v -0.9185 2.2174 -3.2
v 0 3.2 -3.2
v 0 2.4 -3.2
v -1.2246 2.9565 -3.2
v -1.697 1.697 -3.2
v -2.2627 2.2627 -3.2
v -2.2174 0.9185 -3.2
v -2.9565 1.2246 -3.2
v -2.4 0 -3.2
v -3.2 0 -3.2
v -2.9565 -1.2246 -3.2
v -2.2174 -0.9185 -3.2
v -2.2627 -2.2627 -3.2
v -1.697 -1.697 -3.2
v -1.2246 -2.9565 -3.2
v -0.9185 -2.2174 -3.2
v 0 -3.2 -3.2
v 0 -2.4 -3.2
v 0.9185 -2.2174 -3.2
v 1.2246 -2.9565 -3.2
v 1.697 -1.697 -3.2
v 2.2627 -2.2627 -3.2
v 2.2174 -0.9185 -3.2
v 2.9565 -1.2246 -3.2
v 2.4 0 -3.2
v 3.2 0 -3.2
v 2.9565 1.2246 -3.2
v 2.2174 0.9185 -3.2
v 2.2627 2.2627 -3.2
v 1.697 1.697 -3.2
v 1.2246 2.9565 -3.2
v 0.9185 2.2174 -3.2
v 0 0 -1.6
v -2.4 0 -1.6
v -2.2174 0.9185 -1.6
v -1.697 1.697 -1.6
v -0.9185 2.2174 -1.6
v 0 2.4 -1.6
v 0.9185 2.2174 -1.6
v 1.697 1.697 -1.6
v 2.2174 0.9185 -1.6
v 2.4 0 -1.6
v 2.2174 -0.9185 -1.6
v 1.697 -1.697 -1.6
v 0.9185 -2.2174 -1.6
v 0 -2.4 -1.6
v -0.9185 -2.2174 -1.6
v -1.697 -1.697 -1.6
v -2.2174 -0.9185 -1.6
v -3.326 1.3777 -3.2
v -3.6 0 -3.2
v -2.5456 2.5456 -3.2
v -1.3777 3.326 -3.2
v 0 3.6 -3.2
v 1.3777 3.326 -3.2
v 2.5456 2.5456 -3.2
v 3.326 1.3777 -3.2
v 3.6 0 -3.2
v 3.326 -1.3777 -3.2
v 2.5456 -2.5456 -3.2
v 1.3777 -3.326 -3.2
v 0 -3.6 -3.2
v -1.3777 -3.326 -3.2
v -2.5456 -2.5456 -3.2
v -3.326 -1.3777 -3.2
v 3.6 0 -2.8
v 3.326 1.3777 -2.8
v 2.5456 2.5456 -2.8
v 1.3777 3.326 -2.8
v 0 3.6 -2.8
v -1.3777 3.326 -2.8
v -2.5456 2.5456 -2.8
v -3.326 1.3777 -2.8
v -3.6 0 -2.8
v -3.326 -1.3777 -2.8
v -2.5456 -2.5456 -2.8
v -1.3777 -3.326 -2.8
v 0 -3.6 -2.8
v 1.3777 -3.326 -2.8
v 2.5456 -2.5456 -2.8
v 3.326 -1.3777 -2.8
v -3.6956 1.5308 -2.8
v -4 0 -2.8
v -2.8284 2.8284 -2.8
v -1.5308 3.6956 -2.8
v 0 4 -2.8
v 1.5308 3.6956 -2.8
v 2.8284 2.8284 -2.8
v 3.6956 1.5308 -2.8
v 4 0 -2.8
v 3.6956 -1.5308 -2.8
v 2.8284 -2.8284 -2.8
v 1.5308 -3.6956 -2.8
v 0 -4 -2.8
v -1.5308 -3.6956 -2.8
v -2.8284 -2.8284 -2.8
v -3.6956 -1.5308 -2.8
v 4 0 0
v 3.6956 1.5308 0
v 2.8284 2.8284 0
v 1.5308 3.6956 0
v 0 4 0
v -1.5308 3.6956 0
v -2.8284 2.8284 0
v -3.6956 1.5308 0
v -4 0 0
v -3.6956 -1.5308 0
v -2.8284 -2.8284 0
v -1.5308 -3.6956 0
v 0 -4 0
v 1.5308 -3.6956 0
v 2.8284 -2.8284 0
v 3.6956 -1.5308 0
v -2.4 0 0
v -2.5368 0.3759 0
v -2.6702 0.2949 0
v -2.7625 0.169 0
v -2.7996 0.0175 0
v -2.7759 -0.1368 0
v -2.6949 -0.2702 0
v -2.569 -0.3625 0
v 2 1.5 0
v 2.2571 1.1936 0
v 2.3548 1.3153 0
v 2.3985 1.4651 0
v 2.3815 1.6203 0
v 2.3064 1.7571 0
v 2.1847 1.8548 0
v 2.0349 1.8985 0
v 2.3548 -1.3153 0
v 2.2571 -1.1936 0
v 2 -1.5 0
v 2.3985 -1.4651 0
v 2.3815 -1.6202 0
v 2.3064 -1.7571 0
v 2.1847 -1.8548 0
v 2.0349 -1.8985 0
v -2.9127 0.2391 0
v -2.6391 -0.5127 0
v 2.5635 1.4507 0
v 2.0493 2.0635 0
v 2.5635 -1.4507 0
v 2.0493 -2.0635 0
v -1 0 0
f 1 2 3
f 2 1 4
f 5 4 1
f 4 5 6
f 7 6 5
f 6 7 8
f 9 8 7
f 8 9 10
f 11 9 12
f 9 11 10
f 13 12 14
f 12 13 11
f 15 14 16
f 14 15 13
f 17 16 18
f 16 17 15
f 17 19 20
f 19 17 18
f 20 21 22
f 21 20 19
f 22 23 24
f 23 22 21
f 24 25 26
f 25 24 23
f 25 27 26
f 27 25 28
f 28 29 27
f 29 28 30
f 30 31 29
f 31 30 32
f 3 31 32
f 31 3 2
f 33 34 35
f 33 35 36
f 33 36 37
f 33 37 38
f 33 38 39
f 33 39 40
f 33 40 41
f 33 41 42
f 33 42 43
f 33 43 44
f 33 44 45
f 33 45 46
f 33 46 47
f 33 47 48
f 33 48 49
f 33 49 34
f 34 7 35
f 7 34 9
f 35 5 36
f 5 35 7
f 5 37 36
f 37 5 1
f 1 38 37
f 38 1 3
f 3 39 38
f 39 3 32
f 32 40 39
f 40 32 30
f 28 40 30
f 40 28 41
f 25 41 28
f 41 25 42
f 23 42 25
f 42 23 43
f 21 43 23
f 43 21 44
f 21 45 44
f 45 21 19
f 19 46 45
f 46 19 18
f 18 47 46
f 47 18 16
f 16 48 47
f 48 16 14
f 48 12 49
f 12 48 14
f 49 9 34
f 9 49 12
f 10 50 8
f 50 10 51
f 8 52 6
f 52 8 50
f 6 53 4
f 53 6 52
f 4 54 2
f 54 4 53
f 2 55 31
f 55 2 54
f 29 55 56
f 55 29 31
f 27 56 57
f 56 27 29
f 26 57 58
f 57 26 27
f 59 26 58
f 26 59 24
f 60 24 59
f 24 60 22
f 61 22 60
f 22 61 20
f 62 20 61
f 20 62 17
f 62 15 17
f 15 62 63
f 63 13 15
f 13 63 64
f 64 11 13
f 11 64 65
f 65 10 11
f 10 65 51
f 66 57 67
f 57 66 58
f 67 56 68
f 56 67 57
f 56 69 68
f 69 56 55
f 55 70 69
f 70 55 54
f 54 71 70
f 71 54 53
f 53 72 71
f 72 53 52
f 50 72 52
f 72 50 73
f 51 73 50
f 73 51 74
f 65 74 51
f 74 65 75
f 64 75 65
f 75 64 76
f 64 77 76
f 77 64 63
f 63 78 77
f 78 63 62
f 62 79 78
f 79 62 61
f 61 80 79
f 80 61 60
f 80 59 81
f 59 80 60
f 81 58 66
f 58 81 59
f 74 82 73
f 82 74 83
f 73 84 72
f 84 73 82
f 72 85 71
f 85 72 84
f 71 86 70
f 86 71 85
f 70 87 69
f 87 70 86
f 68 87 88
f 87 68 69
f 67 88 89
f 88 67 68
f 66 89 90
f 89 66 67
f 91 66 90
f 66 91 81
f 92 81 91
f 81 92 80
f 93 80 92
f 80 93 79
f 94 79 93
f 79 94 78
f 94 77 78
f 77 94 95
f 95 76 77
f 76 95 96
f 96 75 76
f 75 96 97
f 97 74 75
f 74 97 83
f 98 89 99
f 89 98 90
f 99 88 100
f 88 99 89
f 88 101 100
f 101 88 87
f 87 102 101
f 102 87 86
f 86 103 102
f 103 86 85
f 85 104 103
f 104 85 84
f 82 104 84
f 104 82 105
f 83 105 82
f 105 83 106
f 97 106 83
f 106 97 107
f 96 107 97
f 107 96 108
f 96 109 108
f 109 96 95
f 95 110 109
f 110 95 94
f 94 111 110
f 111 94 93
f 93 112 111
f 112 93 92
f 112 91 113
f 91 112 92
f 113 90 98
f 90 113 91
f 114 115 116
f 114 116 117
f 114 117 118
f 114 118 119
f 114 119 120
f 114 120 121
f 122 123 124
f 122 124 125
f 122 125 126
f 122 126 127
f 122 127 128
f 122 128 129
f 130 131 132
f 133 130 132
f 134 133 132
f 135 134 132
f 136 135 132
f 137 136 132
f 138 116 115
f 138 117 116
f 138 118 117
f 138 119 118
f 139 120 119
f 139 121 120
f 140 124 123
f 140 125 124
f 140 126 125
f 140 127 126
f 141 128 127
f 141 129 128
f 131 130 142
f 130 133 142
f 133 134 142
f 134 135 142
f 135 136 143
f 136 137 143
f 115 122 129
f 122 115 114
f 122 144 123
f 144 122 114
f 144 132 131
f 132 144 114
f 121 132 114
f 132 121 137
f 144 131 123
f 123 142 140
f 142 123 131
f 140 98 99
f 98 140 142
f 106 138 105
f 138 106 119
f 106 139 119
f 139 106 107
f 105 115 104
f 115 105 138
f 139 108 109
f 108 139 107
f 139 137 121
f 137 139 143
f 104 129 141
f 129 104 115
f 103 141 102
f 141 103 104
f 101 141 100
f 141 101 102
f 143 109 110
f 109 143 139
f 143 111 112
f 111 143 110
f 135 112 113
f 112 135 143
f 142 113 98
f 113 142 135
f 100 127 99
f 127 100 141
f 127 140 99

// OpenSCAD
// file: ../p/4-4disc.scad
use <../lib.scad>
function ldraw_lib__4_4disc() = [
// 0 Disc 1.0
// 0 Name: 4-4disc.dat
// 0 Author: James Jessiman
// 0 !LDRAW_ORG Primitive UPDATE 2002-02
// 0 !LICENSE Licensed under CC BY 4.0 : see CAreadme.txt
// 
// 0 BFC CERTIFY CCW
  [0,"BFC","CERTIFY"],
  [0,"BFC","CCW"],
// 
// 0 !HISTORY 1998-12-15 [PTadmin] Official Update 1998-10
// 0 !HISTORY 2002-03-23 [sbliss] Added BFC statement
// 0 !HISTORY 2002-04-25 [PTadmin] Official Update 2002-02
// 0 !HISTORY 2007-06-24 [PTadmin] Header formatted for Contributor Agreement
// 0 !HISTORY 2008-07-01 [PTadmin] Official Update 2008-01
// 
// 
// 3 16 0 0 0 1 0 0 0.9239 0 0.3827
  [3,16,0,0,0,1,0,0,0.9239,0,0.3827],
// 3 16 0 0 0 0.9239 0 0.3827 0.7071 0 0.7071
  [3,16,0,0,0,0.9239,0,0.3827,0.7071,0,0.7071],
// 3 16 0 0 0 0.7071 0 0.7071 0.3827 0 0.9239
  [3,16,0,0,0,0.7071,0,0.7071,0.3827,0,0.9239],
// 3 16 0 0 0 0.3827 0 0.9239 0 0 1
  [3,16,0,0,0,0.3827,0,0.9239,0,0,1],
// 3 16 0 0 0 0 0 1 -0.3827 0 0.9239
  [3,16,0,0,0,0,0,1,-0.3827,0,0.9239],
// 3 16 0 0 0 -0.3827 0 0.9239 -0.7071 0 0.7071
  [3,16,0,0,0,-0.3827,0,0.9239,-0.7071,0,0.7071],
// 3 16 0 0 0 -0.7071 0 0.7071 -0.9239 0 0.3827
  [3,16,0,0,0,-0.7071,0,0.7071,-0.9239,0,0.3827],
// 3 16 0 0 0 -0.9239 0 0.3827 -1 0 -0
  [3,16,0,0,0,-0.9239,0,0.3827,-1,0,-0],
// 3 16 0 0 0 -1 0 -0 -0.9239 0 -0.3827
  [3,16,0,0,0,-1,0,-0,-0.9239,0,-0.3827],
// 3 16 0 0 0 -0.9239 0 -0.3827 -0.7071 0 -0.7071
  [3,16,0,0,0,-0.9239,0,-0.3827,-0.7071,0,-0.7071],
// 3 16 0 0 0 -0.7071 0 -0.7071 -0.3827 0 -0.9239
  [3,16,0,0,0,-0.7071,0,-0.7071,-0.3827,0,-0.9239],
// 3 16 0 0 0 -0.3827 0 -0.9239 0 0 -1
  [3,16,0,0,0,-0.3827,0,-0.9239,0,0,-1],
// 3 16 0 0 0 0 0 -1 0.3827 0 -0.9239
  [3,16,0,0,0,0,0,-1,0.3827,0,-0.9239],
// 3 16 0 0 0 0.3827 0 -0.9239 0.7071 0 -0.7071
  [3,16,0,0,0,0.3827,0,-0.9239,0.7071,0,-0.7071],
// 3 16 0 0 0 0.7071 0 -0.7071 0.9239 0 -0.3827
  [3,16,0,0,0,0.7071,0,-0.7071,0.9239,0,-0.3827],
// 3 16 0 0 0 0.9239 0 -0.3827 1 0 0
  [3,16,0,0,0,0.9239,0,-0.3827,1,0,0],
// 0
];
module ldraw_lib__4_4disc(step=0, col=false, unit=2/5, alt=false, line=0.2, solid=!$preview)
    makepoly(ldraw_lib__4_4disc(), step=step, col=col, unit=unit, alt=alt, line=line, solid=solid);
ldraw_lib__4_4disc(line=0.2);
// file: ../p/4-4ring3.scad
use <../lib.scad>
function ldraw_lib__4_4ring3() = [
// 0 Ring  3 x 1.0
// 0 Name: 4-4ring3.dat
// 0 Author: James Jessiman
// 0 !LDRAW_ORG Primitive UPDATE 2009-01
// 0 !LICENSE Licensed under CC BY 4.0 : see CAreadme.txt
// 
// 0 BFC CERTIFY CCW
  [0,"BFC","CERTIFY"],
  [0,"BFC","CCW"],
// 
// 0 !HISTORY 1998-12-15 [PTadmin] Official Update 1998-10
// 0 !HISTORY 2002-04-05 [hafhead] Added BFC statement
// 0 !HISTORY 2002-04-25 [PTadmin] Official Update 2002-02
// 0 !HISTORY 2007-06-24 [PTadmin] Header formatted for Contributor Agreement
// 0 !HISTORY 2008-07-01 [PTadmin] Official Update 2008-01
// 0 !HISTORY 2008-08-26 [cwdee] Switch polygon winding and rename
// 0 !HISTORY 2009-05-02 [PTadmin] Official Update 2009-01
// 
// 
// 4 16 -1.5308 0 3.6956 -1.1481 0 2.7717 0 0 3 0 0 4
  [4,16,-1.5308,0,3.6956,-1.1481,0,2.7717,0,0,3,0,0,4],
// 4 16 -2.8284 0 2.8284 -2.1213 0 2.1213 -1.1481 0 2.7717 -1.5308 0 3.6956
  [4,16,-2.8284,0,2.8284,-2.1213,0,2.1213,-1.1481,0,2.7717,-1.5308,0,3.6956],
// 4 16 -3.6956 0 1.5308 -2.7717 0 1.1481 -2.1213 0 2.1213 -2.8284 0 2.8284
  [4,16,-3.6956,0,1.5308,-2.7717,0,1.1481,-2.1213,0,2.1213,-2.8284,0,2.8284],
// 4 16 -4 0 0 -3 0 0 -2.7717 0 1.1481 -3.6956 0 1.5308
  [4,16,-4,0,0,-3,0,0,-2.7717,0,1.1481,-3.6956,0,1.5308],
// 4 16 -3.6956 0 -1.5308 -2.7717 0 -1.1481 -3 0 0 -4 0 0
  [4,16,-3.6956,0,-1.5308,-2.7717,0,-1.1481,-3,0,0,-4,0,0],
// 4 16 -2.8284 0 -2.8284 -2.1213 0 -2.1213 -2.7717 0 -1.1481 -3.6956 0 -1.5308
  [4,16,-2.8284,0,-2.8284,-2.1213,0,-2.1213,-2.7717,0,-1.1481,-3.6956,0,-1.5308],
// 4 16 -1.5308 0 -3.6956 -1.1481 0 -2.7717 -2.1213 0 -2.1213 -2.8284 0 -2.8284
  [4,16,-1.5308,0,-3.6956,-1.1481,0,-2.7717,-2.1213,0,-2.1213,-2.8284,0,-2.8284],
// 4 16 0 0 -4 0 0 -3 -1.1481 0 -2.7717 -1.5308 0 -3.6956
  [4,16,0,0,-4,0,0,-3,-1.1481,0,-2.7717,-1.5308,0,-3.6956],
// 4 16 1.5308 0 -3.6956 1.1481 0 -2.7717 0 0 -3 0 0 -4
  [4,16,1.5308,0,-3.6956,1.1481,0,-2.7717,0,0,-3,0,0,-4],
// 4 16 2.8284 0 -2.8284 2.1213 0 -2.1213 1.1481 0 -2.7717 1.5308 0 -3.6956
  [4,16,2.8284,0,-2.8284,2.1213,0,-2.1213,1.1481,0,-2.7717,1.5308,0,-3.6956],
// 4 16 3.6956 0 -1.5308 2.7717 0 -1.1481 2.1213 0 -2.1213 2.8284 0 -2.8284
  [4,16,3.6956,0,-1.5308,2.7717,0,-1.1481,2.1213,0,-2.1213,2.8284,0,-2.8284],
// 4 16 4 0 0 3 0 0 2.7717 0 -1.1481 3.6956 0 -1.5308
  [4,16,4,0,0,3,0,0,2.7717,0,-1.1481,3.6956,0,-1.5308],
// 4 16 3.6956 0 1.5308 2.7717 0 1.1481 3 0 0 4 0 0
  [4,16,3.6956,0,1.5308,2.7717,0,1.1481,3,0,0,4,0,0],
// 4 16 2.8284 0 2.8284 2.1213 0 2.1213 2.7717 0 1.1481 3.6956 0 1.5308
  [4,16,2.8284,0,2.8284,2.1213,0,2.1213,2.7717,0,1.1481,3.6956,0,1.5308],
// 4 16 1.5308 0 3.6956 1.1481 0 2.7717 2.1213 0 2.1213 2.8284 0 2.8284
  [4,16,1.5308,0,3.6956,1.1481,0,2.7717,2.1213,0,2.1213,2.8284,0,2.8284],
// 4 16 0 0 4 0 0 3 1.1481 0 2.7717 1.5308 0 3.6956
  [4,16,0,0,4,0,0,3,1.1481,0,2.7717,1.5308,0,3.6956],
// 0
];
module ldraw_lib__4_4ring3(step=0, col=false, unit=2/5, alt=false, line=0.2, solid=!$preview)
    makepoly(ldraw_lib__4_4ring3(), step=step, col=col, unit=unit, alt=alt, line=line, solid=solid);
ldraw_lib__4_4ring3(line=0.2);
// file: ../p/4-4cylc.scad
use <../lib.scad>
use <4-4cyli.scad>
use <4-4disc.scad>
use <4-4edge.scad>
function ldraw_lib__4_4cylc() = [
// 0 Cylinder Closed 1.0
// 0 Name: 4-4cylc.dat
// 0 Author: Alex Taylor [anathema]
// 0 !LDRAW_ORG Primitive UPDATE 2009-02
// 0 !LICENSE Licensed under CC BY 4.0 : see CAreadme.txt
// 
// 0 BFC CERTIFY CCW
  [0,"BFC","CERTIFY"],
  [0,"BFC","CCW"],
// 
// 0 !HISTORY 2008-12-29 [cwdee] Removed one disc
// 0 !HISTORY 2009-09-03 [PTadmin] Official Update 2009-02
// 
// 
// 1 16 0 0 0 1 0 0 0 1 0 0 0 1 4-4edge.dat
  [1,16,0,0,0,1,0,0,0,1,0,0,0,1, ldraw_lib__4_4edge()],
// 1 16 0 1 0 1 0 0 0 1 0 0 0 1 4-4edge.dat
  [1,16,0,1,0,1,0,0,0,1,0,0,0,1, ldraw_lib__4_4edge()],
// 1 16 0 0 0 1 0 0 0 1 0 0 0 1 4-4disc.dat
  [1,16,0,0,0,1,0,0,0,1,0,0,0,1, ldraw_lib__4_4disc()],
// 1 16 0 0 0 1 0 0 0 1 0 0 0 1 4-4cyli.dat
  [1,16,0,0,0,1,0,0,0,1,0,0,0,1, ldraw_lib__4_4cyli()],
// 0
];
module ldraw_lib__4_4cylc(step=0, col=false, unit=2/5, alt=false, line=0.2, solid=!$preview)
    makepoly(ldraw_lib__4_4cylc(), step=step, col=col, unit=unit, alt=alt, line=line, solid=solid);
ldraw_lib__4_4cylc(line=0.2);
// file: ../p/4-4edge.scad
use <../lib.scad>
function ldraw_lib__4_4edge() = [
// 0 Circle 1.0
// 0 Name: 4-4edge.dat
// 0 Author: James Jessiman
// 0 !LDRAW_ORG Primitive UPDATE 2017-01
// 0 !LICENSE Licensed under CC BY 4.0 : see CAreadme.txt
// 
// 0 BFC CERTIFY CCW
  [0,"BFC","CERTIFY"],
  [0,"BFC","CCW"],
// 
// 0 !HISTORY 1998-12-15 [PTadmin] Official Update 1998-10
// 0 !HISTORY 2005-12-28 [PTadmin] Official Update 2005-01
// 0 !HISTORY 2007-06-24 [PTadmin] Header formatted for Contributor Agreement
// 0 !HISTORY 2008-07-01 [PTadmin] Official Update 2008-01
// 0 !HISTORY 2017-01-15 [Steffen] BFCed
// 0 !HISTORY 2017-12-30 [PTadmin] Official Update 2017-01
// 
// 
// 2 24 1 0 0 0.9239 0 0.3827
  [2,24,1,0,0,0.9239,0,0.3827],
// 2 24 0.9239 0 0.3827 0.7071 0 0.7071
  [2,24,0.9239,0,0.3827,0.7071,0,0.7071],
// 2 24 0.7071 0 0.7071 0.3827 0 0.9239
  [2,24,0.7071,0,0.7071,0.3827,0,0.9239],
// 2 24 0.3827 0 0.9239 0 0 1
  [2,24,0.3827,0,0.9239,0,0,1],
// 2 24 0 0 1 -0.3827 0 0.9239
  [2,24,0,0,1,-0.3827,0,0.9239],
// 2 24 -0.3827 0 0.9239 -0.7071 0 0.7071
  [2,24,-0.3827,0,0.9239,-0.7071,0,0.7071],
// 2 24 -0.7071 0 0.7071 -0.9239 0 0.3827
  [2,24,-0.7071,0,0.7071,-0.9239,0,0.3827],
// 2 24 -0.9239 0 0.3827 -1 0 -0
  [2,24,-0.9239,0,0.3827,-1,0,-0],
// 2 24 -1 0 -0 -0.9239 0 -0.3827
  [2,24,-1,0,-0,-0.9239,0,-0.3827],
// 2 24 -0.9239 0 -0.3827 -0.7071 0 -0.7071
  [2,24,-0.9239,0,-0.3827,-0.7071,0,-0.7071],
// 2 24 -0.7071 0 -0.7071 -0.3827 0 -0.9239
  [2,24,-0.7071,0,-0.7071,-0.3827,0,-0.9239],
// 2 24 -0.3827 0 -0.9239 0 0 -1
  [2,24,-0.3827,0,-0.9239,0,0,-1],
// 2 24 0 0 -1 0.3827 0 -0.9239
  [2,24,0,0,-1,0.3827,0,-0.9239],
// 2 24 0.3827 0 -0.9239 0.7071 0 -0.7071
  [2,24,0.3827,0,-0.9239,0.7071,0,-0.7071],
// 2 24 0.7071 0 -0.7071 0.9239 0 -0.3827
  [2,24,0.7071,0,-0.7071,0.9239,0,-0.3827],
// 2 24 0.9239 0 -0.3827 1 0 0
  [2,24,0.9239,0,-0.3827,1,0,0],
];
module ldraw_lib__4_4edge(step=0, col=false, unit=2/5, alt=false, line=0.2, solid=!$preview)
    makepoly(ldraw_lib__4_4edge(), step=step, col=col, unit=unit, alt=alt, line=line, solid=solid);
ldraw_lib__4_4edge(line=0.2);
// file: ../p/4-4cyli.scad
use <../lib.scad>
function ldraw_lib__4_4cyli() = [
// 0 Cylinder 1.0
// 0 Name: 4-4cyli.dat
// 0 Author: James Jessiman
// 0 !LDRAW_ORG Primitive UPDATE 2005-01
// 0 !LICENSE Licensed under CC BY 4.0 : see CAreadme.txt
// 
// 0 BFC CERTIFY CCW
  [0,"BFC","CERTIFY"],
  [0,"BFC","CCW"],
// 
// 0 !HISTORY 1998-12-15 [PTadmin] Official Update 1998-10
// 0 !HISTORY 2002-03-23 [sbliss] Added BFC statement; merged headers from files in distributions LDraw 0.27 and Complete.
// 0 !HISTORY 2002-04-25 [PTadmin] Official Update 2002-02
// 0 !HISTORY 2004-12-14 [guyvivan] BFC CCW
// 0 !HISTORY 2005-12-28 [PTadmin] Official Update 2005-01
// 0 !HISTORY 2007-06-24 [PTadmin] Header formatted for Contributor Agreement
// 0 !HISTORY 2008-07-01 [PTadmin] Official Update 2008-01
// 
// 
// 4 16 1 1 0 0.9239 1 0.3827 0.9239 0 0.3827 1 0 0
  [4,16,1,1,0,0.9239,1,0.3827,0.9239,0,0.3827,1,0,0],
// 5 24 1 0 0 1 1 0 0.9239 0 0.3827 0.9239 0 -0.3827
  [5,24,1,0,0,1,1,0,0.9239,0,0.3827,0.9239,0,-0.3827],
// 4 16 0.9239 1 0.3827 0.7071 1 0.7071 0.7071 0 0.7071 0.9239 0 0.3827
  [4,16,0.9239,1,0.3827,0.7071,1,0.7071,0.7071,0,0.7071,0.9239,0,0.3827],
// 5 24 0.9239 0 0.3827 0.9239 1 0.3827 0.7071 0 0.7071 1 0 0
  [5,24,0.9239,0,0.3827,0.9239,1,0.3827,0.7071,0,0.7071,1,0,0],
// 4 16 0.7071 1 0.7071 0.3827 1 0.9239 0.3827 0 0.9239 0.7071 0 0.7071
  [4,16,0.7071,1,0.7071,0.3827,1,0.9239,0.3827,0,0.9239,0.7071,0,0.7071],
// 5 24 0.7071 0 0.7071 0.7071 1 0.7071 0.3827 0 0.9239 0.9239 0 0.3827
  [5,24,0.7071,0,0.7071,0.7071,1,0.7071,0.3827,0,0.9239,0.9239,0,0.3827],
// 4 16 0.3827 1 0.9239 0 1 1 0 0 1 0.3827 0 0.9239
  [4,16,0.3827,1,0.9239,0,1,1,0,0,1,0.3827,0,0.9239],
// 5 24 0.3827 0 0.9239 0.3827 1 0.9239 0 0 1 0.7071 0 0.7071
  [5,24,0.3827,0,0.9239,0.3827,1,0.9239,0,0,1,0.7071,0,0.7071],
// 4 16 0 1 1 -0.3827 1 0.9239 -0.3827 0 0.9239 0 0 1
  [4,16,0,1,1,-0.3827,1,0.9239,-0.3827,0,0.9239,0,0,1],
// 5 24 0 0 1 0 1 1 -0.3827 0 0.9239 0.3827 0 0.9239
  [5,24,0,0,1,0,1,1,-0.3827,0,0.9239,0.3827,0,0.9239],
// 4 16 -0.3827 1 0.9239 -0.7071 1 0.7071 -0.7071 0 0.7071 -0.3827 0 0.9239
  [4,16,-0.3827,1,0.9239,-0.7071,1,0.7071,-0.7071,0,0.7071,-0.3827,0,0.9239],
// 5 24 -0.3827 0 0.9239 -0.3827 1 0.9239 -0.7071 0 0.7071 0 0 1
  [5,24,-0.3827,0,0.9239,-0.3827,1,0.9239,-0.7071,0,0.7071,0,0,1],
// 4 16 -0.7071 1 0.7071 -0.9239 1 0.3827 -0.9239 0 0.3827 -0.7071 0 0.7071
  [4,16,-0.7071,1,0.7071,-0.9239,1,0.3827,-0.9239,0,0.3827,-0.7071,0,0.7071],
// 5 24 -0.7071 0 0.7071 -0.7071 1 0.7071 -0.9239 0 0.3827 -0.3827 0 0.9239
  [5,24,-0.7071,0,0.7071,-0.7071,1,0.7071,-0.9239,0,0.3827,-0.3827,0,0.9239],
// 4 16 -0.9239 1 0.3827 -1 1 0 -1 0 0 -0.9239 0 0.3827
  [4,16,-0.9239,1,0.3827,-1,1,0,-1,0,0,-0.9239,0,0.3827],
// 5 24 -0.9239 0 0.3827 -0.9239 1 0.3827 -1 0 0 -0.7071 0 0.7071
  [5,24,-0.9239,0,0.3827,-0.9239,1,0.3827,-1,0,0,-0.7071,0,0.7071],
// 4 16 -1 1 0 -0.9239 1 -0.3827 -0.9239 0 -0.3827 -1 0 0
  [4,16,-1,1,0,-0.9239,1,-0.3827,-0.9239,0,-0.3827,-1,0,0],
// 5 24 -1 0 0 -1 1 0 -0.9239 0 -0.3827 -0.9239 0 0.3827
  [5,24,-1,0,0,-1,1,0,-0.9239,0,-0.3827,-0.9239,0,0.3827],
// 4 16 -0.9239 1 -0.3827 -0.7071 1 -0.7071 -0.7071 0 -0.7071 -0.9239 0 -0.3827
  [4,16,-0.9239,1,-0.3827,-0.7071,1,-0.7071,-0.7071,0,-0.7071,-0.9239,0,-0.3827],
// 5 24 -0.9239 0 -0.3827 -0.9239 1 -0.3827 -0.7071 0 -0.7071 -1 0 0
  [5,24,-0.9239,0,-0.3827,-0.9239,1,-0.3827,-0.7071,0,-0.7071,-1,0,0],
// 4 16 -0.7071 1 -0.7071 -0.3827 1 -0.9239 -0.3827 0 -0.9239 -0.7071 0 -0.7071
  [4,16,-0.7071,1,-0.7071,-0.3827,1,-0.9239,-0.3827,0,-0.9239,-0.7071,0,-0.7071],
// 5 24 -0.7071 0 -0.7071 -0.7071 1 -0.7071 -0.3827 0 -0.9239 -0.9239 0 -0.3827
  [5,24,-0.7071,0,-0.7071,-0.7071,1,-0.7071,-0.3827,0,-0.9239,-0.9239,0,-0.3827],
// 4 16 -0.3827 1 -0.9239 0 1 -1 0 0 -1 -0.3827 0 -0.9239
  [4,16,-0.3827,1,-0.9239,0,1,-1,0,0,-1,-0.3827,0,-0.9239],
// 5 24 -0.3827 0 -0.9239 -0.3827 1 -0.9239 0 0 -1 -0.7071 0 -0.7071
  [5,24,-0.3827,0,-0.9239,-0.3827,1,-0.9239,0,0,-1,-0.7071,0,-0.7071],
// 4 16 0 1 -1 0.3827 1 -0.9239 0.3827 0 -0.9239 0 0 -1
  [4,16,0,1,-1,0.3827,1,-0.9239,0.3827,0,-0.9239,0,0,-1],
// 5 24 0 0 -1 0 1 -1 0.3827 0 -0.9239 -0.3827 0 -0.9239
  [5,24,0,0,-1,0,1,-1,0.3827,0,-0.9239,-0.3827,0,-0.9239],
// 4 16 0.3827 1 -0.9239 0.7071 1 -0.7071 0.7071 0 -0.7071 0.3827 0 -0.9239
  [4,16,0.3827,1,-0.9239,0.7071,1,-0.7071,0.7071,0,-0.7071,0.3827,0,-0.9239],
// 5 24 0.3827 0 -0.9239 0.3827 1 -0.9239 0.7071 0 -0.7071 0 0 -1
  [5,24,0.3827,0,-0.9239,0.3827,1,-0.9239,0.7071,0,-0.7071,0,0,-1],
// 4 16 0.7071 1 -0.7071 0.9239 1 -0.3827 0.9239 0 -0.3827 0.7071 0 -0.7071
  [4,16,0.7071,1,-0.7071,0.9239,1,-0.3827,0.9239,0,-0.3827,0.7071,0,-0.7071],
// 5 24 0.7071 0 -0.7071 0.7071 1 -0.7071 0.9239 0 -0.3827 0.3827 0 -0.9239
  [5,24,0.7071,0,-0.7071,0.7071,1,-0.7071,0.9239,0,-0.3827,0.3827,0,-0.9239],
// 4 16 0.9239 1 -0.3827 1 1 0 1 0 0 0.9239 0 -0.3827
  [4,16,0.9239,1,-0.3827,1,1,0,1,0,0,0.9239,0,-0.3827],
// 5 24 0.9239 0 -0.3827 0.9239 1 -0.3827 1 0 0 0.7071 0 -0.7071
  [5,24,0.9239,0,-0.3827,0.9239,1,-0.3827,1,0,0,0.7071,0,-0.7071],
// 0
];
module ldraw_lib__4_4cyli(step=0, col=false, unit=2/5, alt=false, line=0.2, solid=!$preview)
    makepoly(ldraw_lib__4_4cyli(), step=step, col=col, unit=unit, alt=alt, line=line, solid=solid);
ldraw_lib__4_4cyli(line=0.2);
// file: ../p/empty.scad
use <../lib.scad>
function ldraw_lib__empty() = [
// 0 Empty
// 0 Name: empty.dat
// 0 Author: Steffen [Steffen]
// 0 !LDRAW_ORG Primitive UPDATE 2015-01
// 0 !LICENSE Licensed under CC BY 4.0 : see CAreadme.txt
// 
// 0 BFC CERTIFY CCW
  [0,"BFC","CERTIFY"],
  [0,"BFC","CCW"],
// 
// 0 !HISTORY 2015-10-11 [PTadmin] Official Update 2015-01
// 
// 
// 0 // Tool MLCad cannot handle really empty files. This file is used as a workaround.
// 0 // It exceptionally contains forbidden non-LDRAW standard syntax to satisfy MLCad until it is fixed OR a different editor has become the de-facto LDRAW standard.
// 0 // The line being used here is an "impossible" conditional line which never should be visible,
// 0 // additionally hidden by a syntax explicitly hiding it from displaying.
// 
// 0 MLCAD HIDE 5 24 0 0 0 0.0001 0 0 0.0001 -0.0001 0 0 0 0
];
module ldraw_lib__empty(step=0, col=false, unit=2/5, alt=false, line=0.2, solid=!$preview)
    makepoly(ldraw_lib__empty(), step=step, col=col, unit=unit, alt=alt, line=line, solid=solid);
ldraw_lib__empty(line=0.2);
// file: ../p/stud4o.scad
use <../lib.scad>
use <4-4cylc.scad>
use <4-4ring3.scad>
function ldraw_lib__stud4o() = [
// 0 Stud Tube Open without Outer Cylinder
// 0 Name: stud4o.dat
// 0 Author: Magnus Forsberg [MagFors]
// 0 !LDRAW_ORG Primitive UPDATE 2011-02
// 0 !LICENSE Licensed under CC BY 4.0 : see CAreadme.txt
// 
// 0 !HELP This stud is a "antistud" to be used like a underside stud,
// 0 !HELP but without the outer cylinder.
// 0 !HELP 1 47 0 0 0 1 0 0 0 1 0 0 0 1 stud4.dat
// 
// 0 BFC CERTIFY CCW
  [0,"BFC","CERTIFY"],
  [0,"BFC","CCW"],
// 
// 0 !HISTORY 2011-12-29 [PTadmin] Official Update 2011-02
// 
// 
// 1 16 0 -4 0 2 0 0 0 1 0 0 0 2 4-4ring3.dat
  [1,16,0,-4,0,2,0,0,0,1,0,0,0,2, ldraw_lib__4_4ring3()],
// 0 BFC INVERTNEXT
  [0,"BFC","INVERTNEXT"],
// 1 16 0 0 0 -6 0 0 0 -4 0 0 0 6 4-4cylc.dat
  [1,16,0,0,0,-6,0,0,0,-4,0,0,0,6, ldraw_lib__4_4cylc()],
];
module ldraw_lib__stud4o(step=0, col=false, unit=2/5, alt=false, line=0.2, solid=!$preview)
    makepoly(ldraw_lib__stud4o(), step=step, col=col, unit=unit, alt=alt, line=line, solid=solid);
ldraw_lib__stud4o(line=0.2);
// file: ../p/4-4ring9.scad
use <../lib.scad>
function ldraw_lib__4_4ring9() = [
// 0 Ring  9 x 1.0
// 0 Name: 4-4ring9.dat
// 0 Author: John Riley [jriley]
// 0 !LDRAW_ORG Primitive UPDATE 2004-02
// 0 !LICENSE Licensed under CC BY 2.0 and CC BY 4.0 : see CAreadme.txt
// 
// 0 BFC CERTIFY CCW
  [0,"BFC","CERTIFY"],
  [0,"BFC","CCW"],
// 
// 0 !HISTORY 2004-04-22 [PTadmin] Official Update 2004-02
// 0 !HISTORY 2007-06-24 [PTadmin] Header formatted for Contributor Agreement
// 0 !HISTORY 2008-07-01 [PTadmin] Official Update 2008-01
// 
// 
// 4 16 9 0 0 10 0 0 9.239 0 3.827 8.3151 0 3.4443
  [4,16,9,0,0,10,0,0,9.239,0,3.827,8.3151,0,3.4443],
// 4 16 8.3151 0 3.4443 9.239 0 3.827 7.071 0 7.071 6.3639 0 6.3639
  [4,16,8.3151,0,3.4443,9.239,0,3.827,7.071,0,7.071,6.3639,0,6.3639],
// 4 16 6.3639 0 6.3639 7.071 0 7.071 3.827 0 9.239 3.4443 0 8.3151
  [4,16,6.3639,0,6.3639,7.071,0,7.071,3.827,0,9.239,3.4443,0,8.3151],
// 4 16 3.4443 0 8.3151 3.827 0 9.239 0 0 10 0 0 9
  [4,16,3.4443,0,8.3151,3.827,0,9.239,0,0,10,0,0,9],
// 4 16 0 0 9 0 0 10 -3.827 0 9.239 -3.4443 0 8.3151
  [4,16,0,0,9,0,0,10,-3.827,0,9.239,-3.4443,0,8.3151],
// 4 16 -3.4443 0 8.3151 -3.827 0 9.239 -7.071 0 7.071 -6.3639 0 6.3639
  [4,16,-3.4443,0,8.3151,-3.827,0,9.239,-7.071,0,7.071,-6.3639,0,6.3639],
// 4 16 -6.3639 0 6.3639 -7.071 0 7.071 -9.239 0 3.827 -8.3151 0 3.4443
  [4,16,-6.3639,0,6.3639,-7.071,0,7.071,-9.239,0,3.827,-8.3151,0,3.4443],
// 4 16 -8.3151 0 3.4443 -9.239 0 3.827 -10 0 0 -9 0 0
  [4,16,-8.3151,0,3.4443,-9.239,0,3.827,-10,0,0,-9,0,0],
// 4 16 -9 0 0 -10 0 0 -9.239 0 -3.827 -8.3151 0 -3.4443
  [4,16,-9,0,0,-10,0,0,-9.239,0,-3.827,-8.3151,0,-3.4443],
// 4 16 -8.3151 0 -3.4443 -9.239 0 -3.827 -7.071 0 -7.071 -6.3639 0 -6.3639
  [4,16,-8.3151,0,-3.4443,-9.239,0,-3.827,-7.071,0,-7.071,-6.3639,0,-6.3639],
// 4 16 -6.3639 0 -6.3639 -7.071 0 -7.071 -3.827 0 -9.239 -3.4443 0 -8.3151
  [4,16,-6.3639,0,-6.3639,-7.071,0,-7.071,-3.827,0,-9.239,-3.4443,0,-8.3151],
// 4 16 -3.4443 0 -8.3151 -3.827 0 -9.239 0 0 -10 0 0 -9
  [4,16,-3.4443,0,-8.3151,-3.827,0,-9.239,0,0,-10,0,0,-9],
// 4 16 0 0 -9 0 0 -10 3.827 0 -9.239 3.4443 0 -8.3151
  [4,16,0,0,-9,0,0,-10,3.827,0,-9.239,3.4443,0,-8.3151],
// 4 16 3.4443 0 -8.3151 3.827 0 -9.239 7.071 0 -7.071 6.3639 0 -6.3639
  [4,16,3.4443,0,-8.3151,3.827,0,-9.239,7.071,0,-7.071,6.3639,0,-6.3639],
// 4 16 6.3639 0 -6.3639 7.071 0 -7.071 9.239 0 -3.827 8.3151 0 -3.4443
  [4,16,6.3639,0,-6.3639,7.071,0,-7.071,9.239,0,-3.827,8.3151,0,-3.4443],
// 4 16 8.3151 0 -3.4443 9.239 0 -3.827 10 0 0 9 0 0
  [4,16,8.3151,0,-3.4443,9.239,0,-3.827,10,0,0,9,0,0],
// 0
];
module ldraw_lib__4_4ring9(step=0, col=false, unit=2/5, alt=false, line=0.2, solid=!$preview)
    makepoly(ldraw_lib__4_4ring9(), step=step, col=col, unit=unit, alt=alt, line=line, solid=solid);
ldraw_lib__4_4ring9(line=0.2);
// file: ../p/4-4ring8.scad
use <../lib.scad>
function ldraw_lib__4_4ring8() = [
// 0 Ring  8 x 1.0
// 0 Name: 4-4ring8.dat
// 0 Author: Steffen [Steffen]
// 0 !LDRAW_ORG Primitive UPDATE 2012-01
// 0 !LICENSE Licensed under CC BY 4.0 : see CAreadme.txt
// 
// 0 BFC CERTIFY CCW
  [0,"BFC","CERTIFY"],
  [0,"BFC","CCW"],
// 
// 0 !HISTORY 2003-12-19 [PTadmin] Official Update 2003-03
// 0 !HISTORY 2007-06-24 [PTadmin] Header formatted for Contributor Agreement
// 0 !HISTORY 2008-07-01 [PTadmin] Official Update 2008-01
// 0 !HISTORY 2012-02-16 [Philo] Changed to CCW
// 0 !HISTORY 2012-03-30 [PTadmin] Official Update 2012-01
// 
// 
// 4 16 9 0 0 8.3151 0 3.4443 7.3912 0 3.0616 8 0 0
  [4,16,9,0,0,8.3151,0,3.4443,7.3912,0,3.0616,8,0,0],
// 4 16 8.3151 0 3.4443 6.3639 0 6.3639 5.6568 0 5.6568 7.3912 0 3.0616
  [4,16,8.3151,0,3.4443,6.3639,0,6.3639,5.6568,0,5.6568,7.3912,0,3.0616],
// 4 16 6.3639 0 6.3639 3.4443 0 8.3151 3.0616 0 7.3912 5.6568 0 5.6568
  [4,16,6.3639,0,6.3639,3.4443,0,8.3151,3.0616,0,7.3912,5.6568,0,5.6568],
// 4 16 3.4443 0 8.3151 0 0 9 0 0 8 3.0616 0 7.3912
  [4,16,3.4443,0,8.3151,0,0,9,0,0,8,3.0616,0,7.3912],
// 4 16 0 0 9 -3.4443 0 8.3151 -3.0616 0 7.3912 0 0 8
  [4,16,0,0,9,-3.4443,0,8.3151,-3.0616,0,7.3912,0,0,8],
// 4 16 -3.4443 0 8.3151 -6.3639 0 6.3639 -5.6568 0 5.6568 -3.0616 0 7.3912
  [4,16,-3.4443,0,8.3151,-6.3639,0,6.3639,-5.6568,0,5.6568,-3.0616,0,7.3912],
// 4 16 -6.3639 0 6.3639 -8.3151 0 3.4443 -7.3912 0 3.0616 -5.6568 0 5.6568
  [4,16,-6.3639,0,6.3639,-8.3151,0,3.4443,-7.3912,0,3.0616,-5.6568,0,5.6568],
// 4 16 -8.3151 0 3.4443 -9 0 0 -8 0 0 -7.3912 0 3.0616
  [4,16,-8.3151,0,3.4443,-9,0,0,-8,0,0,-7.3912,0,3.0616],
// 4 16 -9 0 0 -8.3151 0 -3.4443 -7.3912 0 -3.0616 -8 0 0
  [4,16,-9,0,0,-8.3151,0,-3.4443,-7.3912,0,-3.0616,-8,0,0],
// 4 16 -8.3151 0 -3.4443 -6.3639 0 -6.3639 -5.6568 0 -5.6568 -7.3912 0 -3.0616
  [4,16,-8.3151,0,-3.4443,-6.3639,0,-6.3639,-5.6568,0,-5.6568,-7.3912,0,-3.0616],
// 4 16 -6.3639 0 -6.3639 -3.4443 0 -8.3151 -3.0616 0 -7.3912 -5.6568 0 -5.6568
  [4,16,-6.3639,0,-6.3639,-3.4443,0,-8.3151,-3.0616,0,-7.3912,-5.6568,0,-5.6568],
// 4 16 -3.4443 0 -8.3151 0 0 -9 0 0 -8 -3.0616 0 -7.3912
  [4,16,-3.4443,0,-8.3151,0,0,-9,0,0,-8,-3.0616,0,-7.3912],
// 4 16 0 0 -9 3.4443 0 -8.3151 3.0616 0 -7.3912 0 0 -8
  [4,16,0,0,-9,3.4443,0,-8.3151,3.0616,0,-7.3912,0,0,-8],
// 4 16 3.4443 0 -8.3151 6.3639 0 -6.3639 5.6568 0 -5.6568 3.0616 0 -7.3912
  [4,16,3.4443,0,-8.3151,6.3639,0,-6.3639,5.6568,0,-5.6568,3.0616,0,-7.3912],
// 4 16 6.3639 0 -6.3639 8.3151 0 -3.4443 7.3912 0 -3.0616 5.6568 0 -5.6568
  [4,16,6.3639,0,-6.3639,8.3151,0,-3.4443,7.3912,0,-3.0616,5.6568,0,-5.6568],
// 4 16 8.3151 0 -3.4443 9 0 0 8 0 0 7.3912 0 -3.0616
  [4,16,8.3151,0,-3.4443,9,0,0,8,0,0,7.3912,0,-3.0616],
];
module ldraw_lib__4_4ring8(step=0, col=false, unit=2/5, alt=false, line=0.2, solid=!$preview)
    makepoly(ldraw_lib__4_4ring8(), step=step, col=col, unit=unit, alt=alt, line=line, solid=solid);
ldraw_lib__4_4ring8(line=0.2);
// file: ../p/4-4cylo.scad
use <../lib.scad>
use <4-4cyli.scad>
use <4-4edge.scad>
function ldraw_lib__4_4cylo() = [
// 0 Cylinder Open 1.0
// 0 Name: 4-4cylo.dat
// 0 Author: Mark Kennedy [mkennedy]
// 0 !LDRAW_ORG Primitive UPDATE 2010-01
// 0 !LICENSE Licensed under CC BY 4.0 : see CAreadme.txt
// 
// 0 BFC CERTIFY CCW
  [0,"BFC","CERTIFY"],
  [0,"BFC","CCW"],
// 
// 0 !HISTORY 2010-04-05 [PTadmin] Official Update 2010-01
// 
// 
// 1 16 0 0 0 1 0 0 0 1 0 0 0 1 4-4edge.dat
  [1,16,0,0,0,1,0,0,0,1,0,0,0,1, ldraw_lib__4_4edge()],
// 1 16 0 1 0 1 0 0 0 1 0 0 0 1 4-4edge.dat
  [1,16,0,1,0,1,0,0,0,1,0,0,0,1, ldraw_lib__4_4edge()],
// 1 16 0 0 0 1 0 0 0 1 0 0 0 1 4-4cyli.dat
  [1,16,0,0,0,1,0,0,0,1,0,0,0,1, ldraw_lib__4_4cyli()],
// 0
];
module ldraw_lib__4_4cylo(step=0, col=false, unit=2/5, alt=false, line=0.2, solid=!$preview)
    makepoly(ldraw_lib__4_4cylo(), step=step, col=col, unit=unit, alt=alt, line=line, solid=solid);
ldraw_lib__4_4cylo(line=0.2);
// file: ../p/1-16chrd.scad
use <../lib.scad>
use <empty.scad>
function ldraw_lib__1_16chrd() = [
// 0 Chord 0.0625
// 0 Name: 1-16chrd.dat
// 0 Author: Philippe Hurbain [Philo]
// 0 !LDRAW_ORG Primitive UPDATE 2015-01
// 0 !LICENSE Licensed under CC BY 4.0 : see CAreadme.txt
// 
// 0 BFC CERTIFY CCW
  [0,"BFC","CERTIFY"],
  [0,"BFC","CCW"],
// 
// 0 !HISTORY 2015-10-11 [PTadmin] Official Update 2015-01
// 
// 
// 0 // This file is intentionally empty because at the current \P resolution,
// 0 // an 1-16chrd is actually empty. However, this file still is present
// 0 // to allow tools to do primitives substition and fill in a real chrd here,
// 0 // or, if desired, to substitute this with the hi-res 48\1-16chrd.
// 
// 0 // This file is based on an idea by Darats at http://forums.ldraw.org/read.php?19,14500,14500#msg-14500
// 
// 1 16 0 0 0 1 0 0 0 1 0 0 0 1 empty.dat
  [1,16,0,0,0,1,0,0,0,1,0,0,0,1, ldraw_lib__empty()],
];
module ldraw_lib__1_16chrd(step=0, col=false, unit=2/5, alt=false, line=0.2, solid=!$preview)
    makepoly(ldraw_lib__1_16chrd(), step=step, col=col, unit=unit, alt=alt, line=line, solid=solid);
ldraw_lib__1_16chrd(line=0.2);
// file: s/98138s02.scad
use <../../lib.scad>
use <../../p/4-4cylo.scad>
use <../../p/4-4ring8.scad>
use <../../p/4-4ring9.scad>
use <../../p/stud4o.scad>
function ldraw_lib__s__98138s02() = [
// 0 ~Tile  1 x  1 Round with Groove without Complete Top Face
// 0 Name: s\98138s02.dat
// 0 Author: Magnus Forsberg [MagFors]
// 0 !LDRAW_ORG Subpart UPDATE 2020-01
// 0 !LICENSE Licensed under CC BY 4.0 : see CAreadme.txt
// 
// 0 BFC CERTIFY CCW
  [0,"BFC","CERTIFY"],
  [0,"BFC","CCW"],
// 
// 0 !HISTORY 2020-06-28 [PTadmin] Official Update 2020-01
// 
// 
// 1 16 0 4 0 1 0 0 0 -1 0 0 0 1 stud4o.dat
  [1,16,0,4,0,1,0,0,0,-1,0,0,0,1, ldraw_lib__stud4o()],
// 1 16 0 8 0 -1 0 0 0 -1 0 0 0 1 4-4ring8.dat
  [1,16,0,8,0,-1,0,0,0,-1,0,0,0,1, ldraw_lib__4_4ring8()],
// 1 16 0 7 0 9 0 0 0 1 0 0 0 9 4-4cylo.dat
  [1,16,0,7,0,9,0,0,0,1,0,0,0,9, ldraw_lib__4_4cylo()],
// 1 16 0 7 0 -1 0 0 0 -1 0 0 0 1 4-4ring9.dat
  [1,16,0,7,0,-1,0,0,0,-1,0,0,0,1, ldraw_lib__4_4ring9()],
// 1 16 0 0 0 10 0 0 0 7 0 0 0 10 4-4cylo.dat
  [1,16,0,0,0,10,0,0,0,7,0,0,0,10, ldraw_lib__4_4cylo()],
];
module ldraw_lib__s__98138s02(step=0, col=false, unit=2/5, alt=false, line=0.2, solid=!$preview)
    makepoly(ldraw_lib__s__98138s02(), step=step, col=col, unit=unit, alt=alt, line=line, solid=solid);
ldraw_lib__s__98138s02(line=0.2);
// file: ../p/4-4ering.scad
use <../lib.scad>
use <1-16chrd.scad>
function ldraw_lib__4_4ering() = [
// 0 Adapter Ring Triangles to Normal 1.0
// 0 Name: 4-4ering.dat
// 0 Author: Philippe Hurbain [Philo]
// 0 !LDRAW_ORG Primitive UPDATE 2015-01
// 0 !LICENSE Licensed under CC BY 4.0 : see CAreadme.txt
// 
// 0 BFC CERTIFY CCW
  [0,"BFC","CERTIFY"],
  [0,"BFC","CCW"],
// 
// 0 !HISTORY 2015-10-11 [PTadmin] Official Update 2015-01
// 
// 
// 0 // This file uses 1-16chrd (actually empty). It allows
// 0 // tools to do primitives substition and fill in a ring of chrd here,
// 0 // or, if desired, to substitute this with the hi-res 48\1-16chrd.
// 0 // This file is based on an idea by Darats at http://forums.ldraw.org/read.php?19,14500,14500#msg-14500
// 
// 1 16 0 0 0 1 0 0 0 1 0 0 0 1 1-16chrd.dat
  [1,16,0,0,0,1,0,0,0,1,0,0,0,1, ldraw_lib__1_16chrd()],
// 1 16 0 0 0 0.92388 0 0.38268 0 1 0 -0.38268 0 0.92388 1-16chrd.dat
  [1,16,0,0,0,0.92388,0,0.38268,0,1,0,-0.38268,0,0.92388, ldraw_lib__1_16chrd()],
// 1 16 0 0 0 0.70711 0 0.70711 0 1 0 -0.70711 0 0.70711 1-16chrd.dat
  [1,16,0,0,0,0.70711,0,0.70711,0,1,0,-0.70711,0,0.70711, ldraw_lib__1_16chrd()],
// 1 16 0 0 0 0.38268 0 0.92388 0 1 0 -0.92388 0 0.38268 1-16chrd.dat
  [1,16,0,0,0,0.38268,0,0.92388,0,1,0,-0.92388,0,0.38268, ldraw_lib__1_16chrd()],
// 1 16 0 0 0 0 0 1 0 1 0 -1 0 0 1-16chrd.dat
  [1,16,0,0,0,0,0,1,0,1,0,-1,0,0, ldraw_lib__1_16chrd()],
// 1 16 0 0 0 -0.38268 0 0.92388 0 1 0 -0.92388 0 -0.38268 1-16chrd.dat
  [1,16,0,0,0,-0.38268,0,0.92388,0,1,0,-0.92388,0,-0.38268, ldraw_lib__1_16chrd()],
// 1 16 0 0 0 -0.70711 0 0.70711 0 1 0 -0.70711 0 -0.70711 1-16chrd.dat
  [1,16,0,0,0,-0.70711,0,0.70711,0,1,0,-0.70711,0,-0.70711, ldraw_lib__1_16chrd()],
// 1 16 0 0 0 -0.92388 0 0.38268 0 1 0 -0.38268 0 -0.92388 1-16chrd.dat
  [1,16,0,0,0,-0.92388,0,0.38268,0,1,0,-0.38268,0,-0.92388, ldraw_lib__1_16chrd()],
// 1 16 0 0 0 0 0 -1 0 1 0 1 0 0 1-16chrd.dat
  [1,16,0,0,0,0,0,-1,0,1,0,1,0,0, ldraw_lib__1_16chrd()],
// 1 16 0 0 0 0.38268 0 -0.92388 0 1 0 0.92388 0 0.38268 1-16chrd.dat
  [1,16,0,0,0,0.38268,0,-0.92388,0,1,0,0.92388,0,0.38268, ldraw_lib__1_16chrd()],
// 1 16 0 0 0 0.70711 0 -0.70711 0 1 0 0.70711 0 0.70711 1-16chrd.dat
  [1,16,0,0,0,0.70711,0,-0.70711,0,1,0,0.70711,0,0.70711, ldraw_lib__1_16chrd()],
// 1 16 0 0 0 0.92388 0 -0.38268 0 1 0 0.38268 0 0.92388 1-16chrd.dat
  [1,16,0,0,0,0.92388,0,-0.38268,0,1,0,0.38268,0,0.92388, ldraw_lib__1_16chrd()],
// 1 16 0 0 0 -1 0 0 0 1 0 0 0 -1 1-16chrd.dat
  [1,16,0,0,0,-1,0,0,0,1,0,0,0,-1, ldraw_lib__1_16chrd()],
// 1 16 0 0 0 -0.92388 0 -0.38268 0 1 0 0.38268 0 -0.92388 1-16chrd.dat
  [1,16,0,0,0,-0.92388,0,-0.38268,0,1,0,0.38268,0,-0.92388, ldraw_lib__1_16chrd()],
// 1 16 0 0 0 -0.70711 0 -0.70711 0 1 0 0.70711 0 -0.70711 1-16chrd.dat
  [1,16,0,0,0,-0.70711,0,-0.70711,0,1,0,0.70711,0,-0.70711, ldraw_lib__1_16chrd()],
// 1 16 0 0 0 -0.38268 0 -0.92388 0 1 0 0.92388 0 -0.38268 1-16chrd.dat
  [1,16,0,0,0,-0.38268,0,-0.92388,0,1,0,0.92388,0,-0.38268, ldraw_lib__1_16chrd()],
];
module ldraw_lib__4_4ering(step=0, col=false, unit=2/5, alt=false, line=0.2, solid=!$preview)
    makepoly(ldraw_lib__4_4ering(), step=step, col=col, unit=unit, alt=alt, line=line, solid=solid);
ldraw_lib__4_4ering(line=0.2);
// file: ../p/3-8ndis.scad
use <../lib.scad>
function ldraw_lib__3_8ndis() = [
// 0 Disc Negative 0.375
// 0 Name: 3-8ndis.dat
// 0 Author: Alex Taylor [anathema]
// 0 !LDRAW_ORG Primitive UPDATE 2009-02
// 0 !LICENSE Licensed under CC BY 4.0 : see CAreadme.txt
// 
// 0 BFC CERTIFY CCW
  [0,"BFC","CERTIFY"],
  [0,"BFC","CCW"],
// 
// 0 !HISTORY 2009-09-03 [PTadmin] Official Update 2009-02
// 
// 
// 3 16 1 0 1 0.9239 0 0.3827 1 0 0
  [3,16,1,0,1,0.9239,0,0.3827,1,0,0],
// 3 16 1 0 1 0.7071 0 0.7071 0.9239 0 0.3827
  [3,16,1,0,1,0.7071,0,0.7071,0.9239,0,0.3827],
// 3 16 1 0 1 0.3827 0 0.9239 0.7071 0 0.7071
  [3,16,1,0,1,0.3827,0,0.9239,0.7071,0,0.7071],
// 3 16 1 0 1 0 0 1 0.3827 0 0.9239
  [3,16,1,0,1,0,0,1,0.3827,0,0.9239],
// 3 16 -1 0 1 -0.3827 0 0.9239 0 0 1
  [3,16,-1,0,1,-0.3827,0,0.9239,0,0,1],
// 3 16 -1 0 1 -0.7071 0 0.7071 -0.3827 0 0.9239
  [3,16,-1,0,1,-0.7071,0,0.7071,-0.3827,0,0.9239],
// 0
];
module ldraw_lib__3_8ndis(step=0, col=false, unit=2/5, alt=false, line=0.2, solid=!$preview)
    makepoly(ldraw_lib__3_8ndis(), step=step, col=col, unit=unit, alt=alt, line=line, solid=solid);
ldraw_lib__3_8ndis(line=0.2);
// file: ../p/3-8disc.scad
use <../lib.scad>
function ldraw_lib__3_8disc() = [
// 0 Disc 0.375
// 0 Name: 3-8disc.dat
// 0 Author: Guy Vivan [guyvivan]
// 0 !LDRAW_ORG Primitive UPDATE 2009-01
// 0 !LICENSE Licensed under CC BY 2.0 and CC BY 4.0 : see CAreadme.txt
// 
// 0 BFC CERTIFY CCW
  [0,"BFC","CERTIFY"],
  [0,"BFC","CCW"],
// 
// 0 !HISTORY 2009-05-02 [PTadmin] Official Update 2009-01
// 
// 
// 3 16 0 0 0 1 0 0 0.9239 0 0.3827
  [3,16,0,0,0,1,0,0,0.9239,0,0.3827],
// 3 16 0 0 0 0.9239 0 0.3827 0.7071 0 0.7071
  [3,16,0,0,0,0.9239,0,0.3827,0.7071,0,0.7071],
// 3 16 0 0 0 0.7071 0 0.7071 0.3827 0 0.9239
  [3,16,0,0,0,0.7071,0,0.7071,0.3827,0,0.9239],
// 3 16 0 0 0 0.3827 0 0.9239 0 0 1
  [3,16,0,0,0,0.3827,0,0.9239,0,0,1],
// 3 16 0 0 0 0 0 1 -0.3827 0 0.9239
  [3,16,0,0,0,0,0,1,-0.3827,0,0.9239],
// 3 16 0 0 0 -0.3827 0 0.9239 -0.7071 0 0.7071
  [3,16,0,0,0,-0.3827,0,0.9239,-0.7071,0,0.7071],
// 
// 0 end of file
// 
];
module ldraw_lib__3_8disc(step=0, col=false, unit=2/5, alt=false, line=0.2, solid=!$preview)
    makepoly(ldraw_lib__3_8disc(), step=step, col=col, unit=unit, alt=alt, line=line, solid=solid);
ldraw_lib__3_8disc(line=0.2);
// main file
use <../lib.scad>
use <../p/3-8disc.scad>
use <../p/3-8ndis.scad>
use <../p/4-4ering.scad>
use <s/98138s02.scad>
function ldraw_lib__98138p2o() = [
// 0 Tile  1 x  1 Round with Black "<" Pattern
// 0 Name: 98138p2o.dat
// 0 Author: Vincent Messenet [Cheenzo]
// 0 !LDRAW_ORG Part UPDATE 2023-05
// 0 !LICENSE Licensed under CC BY 4.0 : see CAreadme.txt
// 
// 0 BFC CERTIFY CCW
  [0,"BFC","CERTIFY"],
  [0,"BFC","CCW"],
// 
// 0 !KEYWORDS Bricklink 98138pb365, BrickOwl 362640, Greater than, Less than
// 0 !KEYWORDS Rebrickable 98138pr9980, Set 11027, Set 11028, Set 11029, Set 11031
// 0 !KEYWORDS Set 11033, V
// 
// 0 !HISTORY 2023-10-31 [OrionP] Official Update 2023-05
// 
// 
// 1 16 0 0 0 1 0 0 0 1 0 0 0 1 s\98138s02.dat
  [1,16,0,0,0,1,0,0,0,1,0,0,0,1, ldraw_lib__s__98138s02()],
// 1 16 0 0 0 10 0 0 0 1 0 0 0 10 4-4ering.dat
  [1,16,0,0,0,10,0,0,0,1,0,0,0,10, ldraw_lib__4_4ering()],
// 
// 1 0 -6 0 0 -.34202 0 -.93969 0 1 0 .93969 0 -.34202 3-8disc.dat
  [1,0,-6,0,0,-.34202,0,-.93969,0,1,0,.93969,0,-.34202, ldraw_lib__3_8disc()],
// 1 0 5 0 3.75 .64278 0 .76605 0 1 0 -.76605 0 .64278 3-8disc.dat
  [1,0,5,0,3.75,.64278,0,.76605,0,1,0,-.76605,0,.64278, ldraw_lib__3_8disc()],
// 1 0 5 0 -3.75 .64278 0 .76605 0 1 0 .76605 0 -.6427 3-8disc.dat
  [1,0,5,0,-3.75,.64278,0,.76605,0,1,0,.76605,0,-.6427, ldraw_lib__3_8disc()],
// 1 16 -6 0 0 -.34202 0 -.93969 0 1 0 .93969 0 -.34202 3-8ndis.dat
  [1,16,-6,0,0,-.34202,0,-.93969,0,1,0,.93969,0,-.34202, ldraw_lib__3_8ndis()],
// 1 16 5 0 3.75 .64278 0 .76605 0 1 0 -.76605 0 .64278 3-8ndis.dat
  [1,16,5,0,3.75,.64278,0,.76605,0,1,0,-.76605,0,.64278, ldraw_lib__3_8ndis()],
// 1 16 5 0 -3.75 .64278 0 .76605 0 1 0 .76605 0 -.6427 3-8ndis.dat
  [1,16,5,0,-3.75,.64278,0,.76605,0,1,0,.76605,0,-.6427, ldraw_lib__3_8ndis()],
// 4 0 5 0 3.75 5.087164 0 4.746184 -6.34202 0 .93969 -6 0 0
  [4,0,5,0,3.75,5.087164,0,4.746184,-6.34202,0,.93969,-6,0,0],
// 4 0 5 0 3.75 -6 0 0 -2.5 0 0 5.64278 0 2.98395
  [4,0,5,0,3.75,-6,0,0,-2.5,0,0,5.64278,0,2.98395],
// 4 0 5 0 -3.75 5.64278 0 -2.98395 -2.5 0 0 -6 0 0
  [4,0,5,0,-3.75,5.64278,0,-2.98395,-2.5,0,0,-6,0,0],
// 4 0 5 0 -3.75 -6 0 0 -6.422612 0 -.906297 5.087164 0 -4.746127
  [4,0,5,0,-3.75,-6,0,0,-6.422612,0,-.906297,5.087164,0,-4.746127],
// 3 16 -2.5 0 0 5.64278 0 -2.98395 5.64278 0 2.98395
  [3,16,-2.5,0,0,5.64278,0,-2.98395,5.64278,0,2.98395],
// 4 16 6.40883 0 -3.62665 6.40883 0 3.62673 5.64278 0 2.98395 5.64278 0 -2.98395
  [4,16,6.40883,0,-3.62665,6.40883,0,3.62673,5.64278,0,2.98395,5.64278,0,-2.98395],
// 4 16 9.239 0 3.827 6.40883 0 3.62673 6.40883 0 -3.62665 10 0 0
  [4,16,9.239,0,3.827,6.40883,0,3.62673,6.40883,0,-3.62665,10,0,0],
// 4 16 -10 0 0 -6.93969 0 -.34202 -7.28171 0 .59767 -9.239 0 3.827
  [4,16,-10,0,0,-6.93969,0,-.34202,-7.28171,0,.59767,-9.239,0,3.827],
// 4 16 -6.59767 0 -1.28171 -6.93969 0 -.34202 -10 0 0 -9.239 0 -3.827
  [4,16,-6.59767,0,-1.28171,-6.93969,0,-.34202,-10,0,0,-9.239,0,-3.827],
// 4 16 -9.239 0 3.827 -7.28171 0 .59767 -6.34202 0 .93969 -7.071 0 7.071
  [4,16,-9.239,0,3.827,-7.28171,0,.59767,-6.34202,0,.93969,-7.071,0,7.071],
// 4 16 -6.59767 0 -1.28171 -9.239 0 -3.827 -7.071 0 -7.071 -3.827 0 -9.239
  [4,16,-6.59767,0,-1.28171,-9.239,0,-3.827,-7.071,0,-7.071,-3.827,0,-9.239],
// 4 16 -6.59767 0 -1.28171 5.12327 0 -5.15875 5.087164 0 -4.746127 -6.422612 0 -.906297
  [4,16,-6.59767,0,-1.28171,5.12327,0,-5.15875,5.087164,0,-4.746127,-6.422612,0,-.906297],
// 4 16 -6.34202 0 .93969 5.087164 0 4.746184 5.12327 0 5.15883 -7.071 0 7.071
  [4,16,-6.34202,0,.93969,5.087164,0,4.746184,5.12327,0,5.15883,-7.071,0,7.071],
// 4 16 -3.827 0 9.239 -7.071 0 7.071 5.12327 0 5.15883 0 0 10
  [4,16,-3.827,0,9.239,-7.071,0,7.071,5.12327,0,5.15883,0,0,10],
// 4 16 3.827 0 9.239 0 0 10 5.12327 0 5.15883 7.071 0 7.071
  [4,16,3.827,0,9.239,0,0,10,5.12327,0,5.15883,7.071,0,7.071],
// 4 16 0 0 -10 5.12327 0 -5.15875 -6.59767 0 -1.28171 -3.827 0 -9.239
  [4,16,0,0,-10,5.12327,0,-5.15875,-6.59767,0,-1.28171,-3.827,0,-9.239],
// 4 16 5.12327 0 -5.15875 0 0 -10 3.827 0 -9.239 7.071 0 -7.071
  [4,16,5.12327,0,-5.15875,0,0,-10,3.827,0,-9.239,7.071,0,-7.071],
// 4 16 5.76605 0 -4.3927 5.12327 0 -5.15875 7.071 0 -7.071 9.239 0 -3.827
  [4,16,5.76605,0,-4.3927,5.12327,0,-5.15875,7.071,0,-7.071,9.239,0,-3.827],
// 4 16 5.76605 0 -4.3927 9.239 0 -3.827 10 0 0 6.40883 0 -3.62665
  [4,16,5.76605,0,-4.3927,9.239,0,-3.827,10,0,0,6.40883,0,-3.62665],
// 4 16 7.071 0 7.071 5.12327 0 5.15883 5.76605 0 4.39278 9.239 0 3.827
  [4,16,7.071,0,7.071,5.12327,0,5.15883,5.76605,0,4.39278,9.239,0,3.827],
// 3 16 5.76605 0 4.39278 6.40883 0 3.62673 9.239 0 3.827
  [3,16,5.76605,0,4.39278,6.40883,0,3.62673,9.239,0,3.827],
];
module ldraw_lib__98138p2o(step=0, col=false, unit=2/5, alt=false, line=0.2, solid=!$preview)
    makepoly(ldraw_lib__98138p2o(), step=step, col=col, unit=unit, alt=alt, line=line, solid=solid);
ldraw_lib__98138p2o(line=0.2);
